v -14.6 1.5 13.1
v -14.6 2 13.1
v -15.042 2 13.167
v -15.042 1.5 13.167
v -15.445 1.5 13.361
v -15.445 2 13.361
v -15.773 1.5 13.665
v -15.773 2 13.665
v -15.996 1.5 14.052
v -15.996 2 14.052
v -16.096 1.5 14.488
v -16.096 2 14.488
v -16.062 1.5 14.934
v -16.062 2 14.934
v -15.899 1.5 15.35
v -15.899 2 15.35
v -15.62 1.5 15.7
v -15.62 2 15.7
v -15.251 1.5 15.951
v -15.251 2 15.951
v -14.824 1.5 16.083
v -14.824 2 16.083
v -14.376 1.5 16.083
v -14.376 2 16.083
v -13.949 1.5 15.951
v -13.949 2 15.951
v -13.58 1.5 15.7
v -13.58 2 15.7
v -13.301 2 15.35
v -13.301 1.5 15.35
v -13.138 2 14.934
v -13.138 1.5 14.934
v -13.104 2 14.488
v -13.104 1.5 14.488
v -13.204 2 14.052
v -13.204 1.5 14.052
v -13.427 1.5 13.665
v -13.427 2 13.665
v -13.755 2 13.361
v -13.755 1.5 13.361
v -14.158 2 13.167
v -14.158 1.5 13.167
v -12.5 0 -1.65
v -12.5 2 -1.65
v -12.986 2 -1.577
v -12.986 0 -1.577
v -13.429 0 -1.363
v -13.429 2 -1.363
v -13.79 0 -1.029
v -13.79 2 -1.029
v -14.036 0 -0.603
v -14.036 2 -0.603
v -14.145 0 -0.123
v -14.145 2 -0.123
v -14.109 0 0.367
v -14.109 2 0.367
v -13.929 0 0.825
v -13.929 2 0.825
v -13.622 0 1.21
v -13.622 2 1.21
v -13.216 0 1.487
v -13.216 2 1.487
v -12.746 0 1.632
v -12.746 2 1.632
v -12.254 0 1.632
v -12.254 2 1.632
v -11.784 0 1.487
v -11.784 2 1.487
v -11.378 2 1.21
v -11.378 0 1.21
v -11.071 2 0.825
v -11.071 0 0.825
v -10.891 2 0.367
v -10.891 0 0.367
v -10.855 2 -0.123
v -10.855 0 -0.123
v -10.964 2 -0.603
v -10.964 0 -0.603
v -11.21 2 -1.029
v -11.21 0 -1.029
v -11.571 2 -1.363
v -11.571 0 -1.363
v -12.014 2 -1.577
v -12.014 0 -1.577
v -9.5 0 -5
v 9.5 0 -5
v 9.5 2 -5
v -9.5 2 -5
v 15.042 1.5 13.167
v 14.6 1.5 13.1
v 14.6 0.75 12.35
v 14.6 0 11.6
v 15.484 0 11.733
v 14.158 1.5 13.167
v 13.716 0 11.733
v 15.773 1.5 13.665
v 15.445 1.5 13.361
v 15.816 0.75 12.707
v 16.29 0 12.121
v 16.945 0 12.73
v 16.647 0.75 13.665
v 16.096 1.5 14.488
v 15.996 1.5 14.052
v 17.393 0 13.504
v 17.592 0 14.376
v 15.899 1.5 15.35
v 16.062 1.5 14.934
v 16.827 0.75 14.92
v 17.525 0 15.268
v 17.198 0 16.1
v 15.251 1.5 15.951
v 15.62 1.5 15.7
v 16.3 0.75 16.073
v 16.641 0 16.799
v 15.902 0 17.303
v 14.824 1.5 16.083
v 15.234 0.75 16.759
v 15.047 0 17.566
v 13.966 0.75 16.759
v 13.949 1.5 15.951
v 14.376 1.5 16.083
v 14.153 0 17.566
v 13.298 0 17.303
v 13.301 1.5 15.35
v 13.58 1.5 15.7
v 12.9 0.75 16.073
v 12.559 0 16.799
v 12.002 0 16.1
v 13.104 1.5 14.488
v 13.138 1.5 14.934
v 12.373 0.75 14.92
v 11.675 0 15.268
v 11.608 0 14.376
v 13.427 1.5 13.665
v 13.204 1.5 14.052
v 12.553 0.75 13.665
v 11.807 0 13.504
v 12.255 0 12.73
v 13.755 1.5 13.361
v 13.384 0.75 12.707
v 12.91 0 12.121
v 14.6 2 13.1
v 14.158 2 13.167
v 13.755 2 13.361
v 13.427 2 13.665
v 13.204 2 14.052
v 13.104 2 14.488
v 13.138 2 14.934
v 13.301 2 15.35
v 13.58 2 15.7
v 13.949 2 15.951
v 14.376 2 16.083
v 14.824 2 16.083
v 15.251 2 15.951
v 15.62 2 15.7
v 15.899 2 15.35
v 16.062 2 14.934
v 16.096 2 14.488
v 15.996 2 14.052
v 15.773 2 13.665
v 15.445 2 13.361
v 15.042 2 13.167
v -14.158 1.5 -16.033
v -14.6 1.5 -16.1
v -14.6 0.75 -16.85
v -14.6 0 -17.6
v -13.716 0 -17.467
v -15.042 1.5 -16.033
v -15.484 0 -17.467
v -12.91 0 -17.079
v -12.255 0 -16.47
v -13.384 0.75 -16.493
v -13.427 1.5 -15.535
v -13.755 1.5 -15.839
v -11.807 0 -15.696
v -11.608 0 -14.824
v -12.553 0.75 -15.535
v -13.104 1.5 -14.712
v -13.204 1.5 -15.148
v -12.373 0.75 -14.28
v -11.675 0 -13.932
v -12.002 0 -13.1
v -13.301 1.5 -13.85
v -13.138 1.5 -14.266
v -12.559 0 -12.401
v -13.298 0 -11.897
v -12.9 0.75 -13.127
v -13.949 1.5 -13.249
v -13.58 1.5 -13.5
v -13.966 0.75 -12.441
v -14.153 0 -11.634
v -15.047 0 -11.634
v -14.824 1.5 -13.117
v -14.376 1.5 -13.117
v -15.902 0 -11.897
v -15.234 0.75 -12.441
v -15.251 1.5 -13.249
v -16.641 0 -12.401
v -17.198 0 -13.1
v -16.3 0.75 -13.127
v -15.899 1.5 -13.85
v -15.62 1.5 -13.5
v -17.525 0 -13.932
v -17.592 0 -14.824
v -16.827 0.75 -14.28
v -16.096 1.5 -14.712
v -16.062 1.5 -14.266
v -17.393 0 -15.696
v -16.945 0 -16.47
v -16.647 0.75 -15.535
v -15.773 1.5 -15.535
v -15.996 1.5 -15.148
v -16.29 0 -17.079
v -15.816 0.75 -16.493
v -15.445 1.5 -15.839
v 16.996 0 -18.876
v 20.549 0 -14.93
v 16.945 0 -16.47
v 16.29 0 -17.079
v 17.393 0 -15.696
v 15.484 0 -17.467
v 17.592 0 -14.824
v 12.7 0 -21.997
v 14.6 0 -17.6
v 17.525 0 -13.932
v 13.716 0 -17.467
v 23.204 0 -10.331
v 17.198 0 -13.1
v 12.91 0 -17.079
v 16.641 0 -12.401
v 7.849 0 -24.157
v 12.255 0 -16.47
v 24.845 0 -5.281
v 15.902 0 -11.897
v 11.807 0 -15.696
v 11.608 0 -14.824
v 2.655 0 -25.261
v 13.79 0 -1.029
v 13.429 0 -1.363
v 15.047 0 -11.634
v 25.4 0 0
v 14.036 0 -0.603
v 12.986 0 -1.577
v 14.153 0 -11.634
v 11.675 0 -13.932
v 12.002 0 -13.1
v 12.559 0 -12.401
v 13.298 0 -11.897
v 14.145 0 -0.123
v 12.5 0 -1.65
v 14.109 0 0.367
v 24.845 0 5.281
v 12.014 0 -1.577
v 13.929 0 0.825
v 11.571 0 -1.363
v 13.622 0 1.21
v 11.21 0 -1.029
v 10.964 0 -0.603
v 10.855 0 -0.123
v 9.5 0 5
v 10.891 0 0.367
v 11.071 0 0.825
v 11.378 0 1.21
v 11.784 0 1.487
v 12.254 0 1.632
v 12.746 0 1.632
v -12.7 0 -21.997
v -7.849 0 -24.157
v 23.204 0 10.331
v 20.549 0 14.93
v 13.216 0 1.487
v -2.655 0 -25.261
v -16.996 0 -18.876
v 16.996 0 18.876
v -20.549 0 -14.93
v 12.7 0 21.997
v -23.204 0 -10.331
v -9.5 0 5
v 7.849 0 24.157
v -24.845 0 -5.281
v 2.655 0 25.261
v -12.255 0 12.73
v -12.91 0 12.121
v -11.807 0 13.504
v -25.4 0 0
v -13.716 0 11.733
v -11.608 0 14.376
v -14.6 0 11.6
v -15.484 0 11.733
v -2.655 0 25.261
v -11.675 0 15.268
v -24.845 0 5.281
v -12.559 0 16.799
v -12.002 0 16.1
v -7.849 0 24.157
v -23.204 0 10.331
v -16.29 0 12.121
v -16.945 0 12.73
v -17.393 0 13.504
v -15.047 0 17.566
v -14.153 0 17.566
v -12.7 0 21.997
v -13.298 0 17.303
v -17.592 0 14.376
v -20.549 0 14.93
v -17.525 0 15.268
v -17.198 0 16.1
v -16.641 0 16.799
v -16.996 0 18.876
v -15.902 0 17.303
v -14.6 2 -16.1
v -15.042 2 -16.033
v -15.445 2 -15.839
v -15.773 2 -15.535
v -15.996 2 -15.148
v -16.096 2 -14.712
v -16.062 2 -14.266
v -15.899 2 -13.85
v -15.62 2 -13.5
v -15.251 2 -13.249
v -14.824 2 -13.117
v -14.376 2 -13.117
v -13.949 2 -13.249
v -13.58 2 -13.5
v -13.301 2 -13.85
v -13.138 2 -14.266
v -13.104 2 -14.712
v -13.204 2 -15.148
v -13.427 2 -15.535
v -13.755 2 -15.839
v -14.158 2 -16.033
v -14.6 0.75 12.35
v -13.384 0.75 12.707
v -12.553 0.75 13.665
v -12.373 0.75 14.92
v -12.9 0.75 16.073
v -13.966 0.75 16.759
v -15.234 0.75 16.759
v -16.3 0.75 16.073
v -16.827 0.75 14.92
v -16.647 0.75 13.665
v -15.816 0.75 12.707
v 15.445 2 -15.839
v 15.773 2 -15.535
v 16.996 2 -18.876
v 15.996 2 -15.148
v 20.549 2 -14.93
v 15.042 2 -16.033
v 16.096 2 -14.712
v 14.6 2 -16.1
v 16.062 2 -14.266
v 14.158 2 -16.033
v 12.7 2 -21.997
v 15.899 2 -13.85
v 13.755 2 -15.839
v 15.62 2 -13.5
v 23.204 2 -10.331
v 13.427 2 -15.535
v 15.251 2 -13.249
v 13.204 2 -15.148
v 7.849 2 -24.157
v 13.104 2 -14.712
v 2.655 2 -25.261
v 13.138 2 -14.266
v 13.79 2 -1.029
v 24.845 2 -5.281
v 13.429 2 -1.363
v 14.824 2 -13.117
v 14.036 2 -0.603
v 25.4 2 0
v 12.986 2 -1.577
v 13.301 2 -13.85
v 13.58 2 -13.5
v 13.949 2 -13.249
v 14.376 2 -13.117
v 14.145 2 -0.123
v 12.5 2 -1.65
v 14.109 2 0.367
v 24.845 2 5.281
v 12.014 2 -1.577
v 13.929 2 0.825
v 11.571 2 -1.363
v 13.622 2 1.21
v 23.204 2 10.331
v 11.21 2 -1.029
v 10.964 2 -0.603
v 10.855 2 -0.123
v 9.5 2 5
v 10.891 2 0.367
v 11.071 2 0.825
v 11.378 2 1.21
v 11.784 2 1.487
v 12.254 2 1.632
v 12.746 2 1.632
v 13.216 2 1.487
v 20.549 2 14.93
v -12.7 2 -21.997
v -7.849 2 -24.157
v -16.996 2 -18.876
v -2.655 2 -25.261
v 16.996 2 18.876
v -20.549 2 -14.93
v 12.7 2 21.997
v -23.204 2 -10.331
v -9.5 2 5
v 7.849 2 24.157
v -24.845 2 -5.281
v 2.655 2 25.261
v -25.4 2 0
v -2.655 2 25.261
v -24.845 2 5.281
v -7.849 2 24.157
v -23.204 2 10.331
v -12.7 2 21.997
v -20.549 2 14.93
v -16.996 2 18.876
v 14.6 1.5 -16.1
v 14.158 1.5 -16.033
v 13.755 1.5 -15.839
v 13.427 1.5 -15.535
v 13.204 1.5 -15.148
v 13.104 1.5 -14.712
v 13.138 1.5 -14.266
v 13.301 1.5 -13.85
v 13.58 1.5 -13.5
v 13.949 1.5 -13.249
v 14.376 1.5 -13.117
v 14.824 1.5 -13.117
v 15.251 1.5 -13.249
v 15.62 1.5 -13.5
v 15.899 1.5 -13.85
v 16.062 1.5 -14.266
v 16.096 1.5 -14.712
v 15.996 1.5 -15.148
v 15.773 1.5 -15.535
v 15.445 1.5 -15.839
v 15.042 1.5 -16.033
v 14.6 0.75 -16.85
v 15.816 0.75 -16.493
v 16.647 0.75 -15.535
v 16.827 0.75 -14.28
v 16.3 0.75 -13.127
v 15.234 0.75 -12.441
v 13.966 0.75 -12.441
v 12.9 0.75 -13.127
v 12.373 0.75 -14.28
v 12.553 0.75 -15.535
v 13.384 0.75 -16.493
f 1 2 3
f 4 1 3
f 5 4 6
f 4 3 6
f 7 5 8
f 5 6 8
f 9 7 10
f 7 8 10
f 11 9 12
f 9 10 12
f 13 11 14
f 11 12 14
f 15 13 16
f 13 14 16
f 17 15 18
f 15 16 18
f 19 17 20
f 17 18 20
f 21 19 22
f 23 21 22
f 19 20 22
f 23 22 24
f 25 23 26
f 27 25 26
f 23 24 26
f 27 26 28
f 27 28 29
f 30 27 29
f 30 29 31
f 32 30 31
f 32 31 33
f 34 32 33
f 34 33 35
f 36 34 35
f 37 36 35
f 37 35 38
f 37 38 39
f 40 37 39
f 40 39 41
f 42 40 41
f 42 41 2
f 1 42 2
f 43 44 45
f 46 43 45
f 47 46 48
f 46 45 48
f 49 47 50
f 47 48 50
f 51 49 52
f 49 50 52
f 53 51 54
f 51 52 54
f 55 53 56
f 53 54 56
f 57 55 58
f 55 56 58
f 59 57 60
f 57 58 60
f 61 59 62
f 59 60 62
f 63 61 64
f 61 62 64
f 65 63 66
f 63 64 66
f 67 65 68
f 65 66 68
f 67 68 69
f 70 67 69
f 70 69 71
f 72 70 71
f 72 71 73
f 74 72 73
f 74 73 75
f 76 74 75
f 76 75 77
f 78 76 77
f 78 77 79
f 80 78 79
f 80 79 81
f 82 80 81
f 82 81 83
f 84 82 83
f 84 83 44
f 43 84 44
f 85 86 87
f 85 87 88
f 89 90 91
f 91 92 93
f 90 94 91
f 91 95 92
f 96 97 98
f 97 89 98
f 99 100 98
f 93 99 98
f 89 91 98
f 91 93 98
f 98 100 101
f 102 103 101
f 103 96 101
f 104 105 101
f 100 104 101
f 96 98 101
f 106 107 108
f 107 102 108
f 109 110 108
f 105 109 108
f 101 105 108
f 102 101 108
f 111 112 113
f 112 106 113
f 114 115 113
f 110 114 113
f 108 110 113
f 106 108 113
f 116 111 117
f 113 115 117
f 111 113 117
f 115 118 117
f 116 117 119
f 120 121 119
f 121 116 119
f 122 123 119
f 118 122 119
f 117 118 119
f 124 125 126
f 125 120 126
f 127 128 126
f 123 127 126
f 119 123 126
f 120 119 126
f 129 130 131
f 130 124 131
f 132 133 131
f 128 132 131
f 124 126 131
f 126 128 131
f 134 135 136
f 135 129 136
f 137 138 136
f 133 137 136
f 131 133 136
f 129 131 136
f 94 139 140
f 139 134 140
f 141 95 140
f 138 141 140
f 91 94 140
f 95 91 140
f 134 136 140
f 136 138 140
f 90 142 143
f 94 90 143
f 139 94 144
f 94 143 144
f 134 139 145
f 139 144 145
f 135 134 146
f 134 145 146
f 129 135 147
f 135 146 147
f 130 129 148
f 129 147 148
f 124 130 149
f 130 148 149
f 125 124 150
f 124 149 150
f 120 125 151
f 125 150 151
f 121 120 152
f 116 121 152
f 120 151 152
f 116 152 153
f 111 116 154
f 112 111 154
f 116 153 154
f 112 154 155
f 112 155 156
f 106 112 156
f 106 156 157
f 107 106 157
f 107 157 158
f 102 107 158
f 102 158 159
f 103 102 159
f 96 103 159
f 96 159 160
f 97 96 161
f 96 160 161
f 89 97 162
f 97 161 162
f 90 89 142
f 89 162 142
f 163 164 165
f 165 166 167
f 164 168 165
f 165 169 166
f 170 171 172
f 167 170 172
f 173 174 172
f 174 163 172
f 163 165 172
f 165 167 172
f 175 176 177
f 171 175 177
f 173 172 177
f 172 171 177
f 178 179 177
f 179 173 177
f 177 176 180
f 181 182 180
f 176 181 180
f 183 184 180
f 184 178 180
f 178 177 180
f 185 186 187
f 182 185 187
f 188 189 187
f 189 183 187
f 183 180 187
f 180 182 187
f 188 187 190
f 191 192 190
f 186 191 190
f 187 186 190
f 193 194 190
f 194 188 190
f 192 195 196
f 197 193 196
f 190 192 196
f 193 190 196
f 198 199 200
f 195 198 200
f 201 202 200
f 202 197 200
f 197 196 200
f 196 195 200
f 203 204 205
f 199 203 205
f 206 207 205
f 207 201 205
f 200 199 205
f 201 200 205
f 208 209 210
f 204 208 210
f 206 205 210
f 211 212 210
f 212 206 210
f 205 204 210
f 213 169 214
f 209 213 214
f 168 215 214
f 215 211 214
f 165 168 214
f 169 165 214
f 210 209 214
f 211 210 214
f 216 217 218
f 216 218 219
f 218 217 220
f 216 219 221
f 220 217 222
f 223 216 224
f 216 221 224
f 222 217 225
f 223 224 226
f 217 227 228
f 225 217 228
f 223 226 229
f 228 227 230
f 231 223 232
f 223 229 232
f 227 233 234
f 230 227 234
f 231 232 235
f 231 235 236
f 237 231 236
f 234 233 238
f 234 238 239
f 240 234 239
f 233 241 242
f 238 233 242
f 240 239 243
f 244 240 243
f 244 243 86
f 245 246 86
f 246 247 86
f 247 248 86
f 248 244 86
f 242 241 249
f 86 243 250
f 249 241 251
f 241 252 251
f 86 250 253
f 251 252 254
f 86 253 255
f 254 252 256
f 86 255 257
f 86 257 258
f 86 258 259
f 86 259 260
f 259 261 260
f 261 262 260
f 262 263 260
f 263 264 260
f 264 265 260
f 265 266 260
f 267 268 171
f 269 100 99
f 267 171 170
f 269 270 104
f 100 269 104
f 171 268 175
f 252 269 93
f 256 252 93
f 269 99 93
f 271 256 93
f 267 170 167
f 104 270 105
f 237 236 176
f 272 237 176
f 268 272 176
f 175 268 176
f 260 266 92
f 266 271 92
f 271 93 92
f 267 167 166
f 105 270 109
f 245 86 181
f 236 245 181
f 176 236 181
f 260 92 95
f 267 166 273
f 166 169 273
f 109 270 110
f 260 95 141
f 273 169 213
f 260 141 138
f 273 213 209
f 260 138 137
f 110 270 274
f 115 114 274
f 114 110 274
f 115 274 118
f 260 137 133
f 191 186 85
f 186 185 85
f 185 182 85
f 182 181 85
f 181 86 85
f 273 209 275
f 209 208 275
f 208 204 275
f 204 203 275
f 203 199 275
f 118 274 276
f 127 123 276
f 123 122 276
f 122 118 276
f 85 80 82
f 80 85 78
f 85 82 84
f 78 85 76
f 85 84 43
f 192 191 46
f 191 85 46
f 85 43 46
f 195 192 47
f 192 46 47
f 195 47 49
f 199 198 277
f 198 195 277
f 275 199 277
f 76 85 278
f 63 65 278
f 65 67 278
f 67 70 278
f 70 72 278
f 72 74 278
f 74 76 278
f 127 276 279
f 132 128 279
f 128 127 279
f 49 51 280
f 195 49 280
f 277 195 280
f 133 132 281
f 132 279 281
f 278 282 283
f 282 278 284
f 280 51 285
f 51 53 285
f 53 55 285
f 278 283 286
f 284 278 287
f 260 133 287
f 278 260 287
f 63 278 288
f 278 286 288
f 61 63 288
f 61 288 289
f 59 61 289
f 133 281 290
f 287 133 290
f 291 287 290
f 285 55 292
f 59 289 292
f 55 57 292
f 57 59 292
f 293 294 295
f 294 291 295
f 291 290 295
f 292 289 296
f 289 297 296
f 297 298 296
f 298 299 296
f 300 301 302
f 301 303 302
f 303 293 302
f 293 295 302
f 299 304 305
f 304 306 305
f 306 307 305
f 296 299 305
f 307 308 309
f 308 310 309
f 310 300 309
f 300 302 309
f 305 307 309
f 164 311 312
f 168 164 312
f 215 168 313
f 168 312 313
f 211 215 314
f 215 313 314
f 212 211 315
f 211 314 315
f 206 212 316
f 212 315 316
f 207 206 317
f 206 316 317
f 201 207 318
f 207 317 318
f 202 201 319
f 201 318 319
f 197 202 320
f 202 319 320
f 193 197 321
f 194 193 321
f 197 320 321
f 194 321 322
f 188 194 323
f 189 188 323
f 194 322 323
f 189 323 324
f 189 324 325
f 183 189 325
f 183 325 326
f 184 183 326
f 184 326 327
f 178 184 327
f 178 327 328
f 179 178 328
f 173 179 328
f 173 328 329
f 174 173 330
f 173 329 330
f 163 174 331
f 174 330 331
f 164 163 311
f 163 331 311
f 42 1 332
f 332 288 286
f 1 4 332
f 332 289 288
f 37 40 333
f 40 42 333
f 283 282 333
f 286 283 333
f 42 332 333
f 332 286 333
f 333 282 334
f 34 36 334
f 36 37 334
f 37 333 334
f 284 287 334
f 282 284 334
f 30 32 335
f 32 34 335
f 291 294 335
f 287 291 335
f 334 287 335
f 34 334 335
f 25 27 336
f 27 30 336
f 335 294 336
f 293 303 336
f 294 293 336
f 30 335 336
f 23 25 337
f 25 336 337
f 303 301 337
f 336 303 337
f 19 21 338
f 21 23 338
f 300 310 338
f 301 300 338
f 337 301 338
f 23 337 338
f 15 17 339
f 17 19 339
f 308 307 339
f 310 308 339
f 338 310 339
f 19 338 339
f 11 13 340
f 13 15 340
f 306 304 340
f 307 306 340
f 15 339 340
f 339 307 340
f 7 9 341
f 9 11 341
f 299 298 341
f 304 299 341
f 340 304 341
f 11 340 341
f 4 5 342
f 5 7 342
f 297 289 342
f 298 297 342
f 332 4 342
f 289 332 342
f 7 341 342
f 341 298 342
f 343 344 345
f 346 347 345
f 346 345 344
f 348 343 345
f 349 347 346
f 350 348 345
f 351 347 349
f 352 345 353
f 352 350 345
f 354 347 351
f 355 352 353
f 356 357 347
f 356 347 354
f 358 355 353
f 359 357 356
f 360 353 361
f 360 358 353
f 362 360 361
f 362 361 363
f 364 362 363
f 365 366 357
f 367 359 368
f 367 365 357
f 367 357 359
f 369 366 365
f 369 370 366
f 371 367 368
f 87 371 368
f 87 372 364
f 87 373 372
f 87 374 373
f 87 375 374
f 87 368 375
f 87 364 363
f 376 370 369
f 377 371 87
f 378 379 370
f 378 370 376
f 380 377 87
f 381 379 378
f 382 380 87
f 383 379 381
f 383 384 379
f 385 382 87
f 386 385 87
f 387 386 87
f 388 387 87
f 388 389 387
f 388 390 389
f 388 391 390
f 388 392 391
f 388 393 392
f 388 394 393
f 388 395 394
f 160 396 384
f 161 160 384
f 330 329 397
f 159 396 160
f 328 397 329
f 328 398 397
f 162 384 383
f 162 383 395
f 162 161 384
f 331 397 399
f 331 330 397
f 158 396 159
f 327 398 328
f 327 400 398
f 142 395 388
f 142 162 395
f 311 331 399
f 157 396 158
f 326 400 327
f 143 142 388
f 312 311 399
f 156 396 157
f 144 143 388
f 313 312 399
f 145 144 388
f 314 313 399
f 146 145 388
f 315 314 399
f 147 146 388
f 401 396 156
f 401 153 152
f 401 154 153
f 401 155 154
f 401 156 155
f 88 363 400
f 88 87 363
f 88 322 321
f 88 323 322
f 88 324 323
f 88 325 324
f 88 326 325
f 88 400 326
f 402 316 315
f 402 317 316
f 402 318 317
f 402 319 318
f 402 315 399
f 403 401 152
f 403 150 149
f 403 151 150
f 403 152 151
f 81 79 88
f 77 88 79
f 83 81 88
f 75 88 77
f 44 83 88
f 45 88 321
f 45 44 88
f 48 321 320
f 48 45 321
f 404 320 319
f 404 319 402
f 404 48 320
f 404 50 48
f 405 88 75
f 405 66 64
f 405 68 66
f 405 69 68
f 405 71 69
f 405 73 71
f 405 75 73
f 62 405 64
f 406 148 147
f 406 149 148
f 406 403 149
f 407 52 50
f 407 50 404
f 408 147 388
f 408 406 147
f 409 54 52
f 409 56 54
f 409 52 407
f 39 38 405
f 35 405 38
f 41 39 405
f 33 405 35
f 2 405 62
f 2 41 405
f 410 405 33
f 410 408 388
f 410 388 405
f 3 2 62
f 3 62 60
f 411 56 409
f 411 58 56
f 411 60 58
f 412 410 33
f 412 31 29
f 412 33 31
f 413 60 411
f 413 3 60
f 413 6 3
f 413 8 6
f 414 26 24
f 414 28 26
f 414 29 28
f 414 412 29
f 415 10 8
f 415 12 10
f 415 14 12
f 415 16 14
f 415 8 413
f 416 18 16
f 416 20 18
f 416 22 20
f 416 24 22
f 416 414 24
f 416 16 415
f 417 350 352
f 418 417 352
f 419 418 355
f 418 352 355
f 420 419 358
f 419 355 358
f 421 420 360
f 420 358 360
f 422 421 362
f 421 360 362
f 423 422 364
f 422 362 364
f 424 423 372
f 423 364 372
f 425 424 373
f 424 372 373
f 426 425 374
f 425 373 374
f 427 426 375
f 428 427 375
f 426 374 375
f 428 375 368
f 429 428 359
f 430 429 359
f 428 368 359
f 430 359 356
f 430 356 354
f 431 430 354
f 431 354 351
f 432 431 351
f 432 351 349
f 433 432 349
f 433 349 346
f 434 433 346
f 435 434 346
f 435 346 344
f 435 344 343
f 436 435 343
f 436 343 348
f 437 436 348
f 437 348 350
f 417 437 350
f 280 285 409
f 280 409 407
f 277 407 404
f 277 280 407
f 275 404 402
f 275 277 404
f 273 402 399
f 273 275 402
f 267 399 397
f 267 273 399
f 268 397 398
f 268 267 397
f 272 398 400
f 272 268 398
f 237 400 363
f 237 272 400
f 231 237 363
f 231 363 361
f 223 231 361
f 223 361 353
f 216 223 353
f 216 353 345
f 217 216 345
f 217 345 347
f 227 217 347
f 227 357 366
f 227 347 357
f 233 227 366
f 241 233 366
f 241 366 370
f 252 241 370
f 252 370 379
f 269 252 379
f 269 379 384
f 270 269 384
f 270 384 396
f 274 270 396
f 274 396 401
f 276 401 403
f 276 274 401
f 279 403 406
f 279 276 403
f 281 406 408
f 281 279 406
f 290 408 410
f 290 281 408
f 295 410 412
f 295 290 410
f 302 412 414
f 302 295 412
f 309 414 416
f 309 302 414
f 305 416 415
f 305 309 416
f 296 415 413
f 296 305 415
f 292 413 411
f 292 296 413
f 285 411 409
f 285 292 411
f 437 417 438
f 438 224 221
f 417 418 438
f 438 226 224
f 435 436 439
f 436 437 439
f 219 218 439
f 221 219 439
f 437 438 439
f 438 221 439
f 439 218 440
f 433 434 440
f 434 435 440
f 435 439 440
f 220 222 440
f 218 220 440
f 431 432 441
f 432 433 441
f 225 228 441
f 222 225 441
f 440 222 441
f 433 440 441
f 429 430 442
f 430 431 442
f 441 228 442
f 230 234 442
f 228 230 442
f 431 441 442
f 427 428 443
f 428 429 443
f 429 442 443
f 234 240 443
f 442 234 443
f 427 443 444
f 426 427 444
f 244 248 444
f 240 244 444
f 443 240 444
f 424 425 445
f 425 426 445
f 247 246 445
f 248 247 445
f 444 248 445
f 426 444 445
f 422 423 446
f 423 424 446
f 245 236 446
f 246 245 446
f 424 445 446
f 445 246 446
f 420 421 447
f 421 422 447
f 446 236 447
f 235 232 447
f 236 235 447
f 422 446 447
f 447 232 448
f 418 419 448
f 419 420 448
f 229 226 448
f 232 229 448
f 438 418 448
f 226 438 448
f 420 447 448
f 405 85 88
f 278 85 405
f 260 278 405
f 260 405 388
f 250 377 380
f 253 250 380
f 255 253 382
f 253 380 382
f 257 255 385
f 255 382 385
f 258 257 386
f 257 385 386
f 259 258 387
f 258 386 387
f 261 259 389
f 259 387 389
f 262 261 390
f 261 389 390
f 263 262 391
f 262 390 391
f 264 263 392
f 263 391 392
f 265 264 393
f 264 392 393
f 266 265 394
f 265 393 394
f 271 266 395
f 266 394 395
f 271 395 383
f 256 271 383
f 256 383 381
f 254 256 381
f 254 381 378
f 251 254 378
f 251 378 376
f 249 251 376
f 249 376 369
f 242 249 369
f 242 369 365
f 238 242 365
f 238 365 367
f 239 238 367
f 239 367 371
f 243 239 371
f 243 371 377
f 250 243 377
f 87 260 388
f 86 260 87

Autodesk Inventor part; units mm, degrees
ref_plane "YZ Plane" through (0, 0, 0) normal (1, 0, 0) x (0, 1, 0)
ref_plane "XZ Plane" through (0, 0, 0) normal (0, 1, 0) x (-1, 0, 0)
ref_plane "XY Plane" through (0, 0, 0) normal (0, 0, 1) x (1, 0, 0)
sketch "Skizze1" plane through (0, 0, 0) normal (0, 1, 0) x (-1, 0, 0)
  circle A0 centre (0, 0) radius 25.4
  dimension "d0" = 50.8
extrude "Extrusion1" add sketch "Skizze1" along normal blind 2
sketch "Skizze2" plane through (0, 0, 0) normal (0, -1, 0) x (1, 0, 0)
  circle A0 centre (0, 0) radius 25.4 projected
  line L0 (-14.6, 14.6) -> (14.6, 14.6) construction
  line L1 (14.6, 14.6) -> (14.6, -14.6) construction
  line L2 (14.6, -14.6) -> (-14.6, -14.6) construction
  line L3 (-14.6, -14.6) -> (-14.6, 14.6) construction
  line L4 (0, 0) -> (14.6, 0) construction
  line L5 (0, 0) -> (0, 14.6) construction
  dimension "d3" = 29.2
  dimension "d4" = 29.2
hole "Bohrung1" at (-14.6, 0, 14.6) at (14.6, 0, 14.6) at (14.6, 0, -14.6) at (-14.6, 0, -14.6) direction (0, 1, 0) diameter 3 end through all countersink diameter 6 countersink angle 90
sketch "Skizze7" plane through (0, 0, 0) normal (0, -1, 0) x (1, 0, 0)
  circle A0 centre (0, 0) radius 25.4 projected
  line L0 (-9.5, 5) -> (9.5, 5)
  line L1 (9.5, 5) -> (9.5, -5)
  line L2 (9.5, -5) -> (-9.5, -5)
  line L3 (-9.5, -5) -> (-9.5, 5)
  line L4 (0, 0) -> (9.5, 0) construction
  line L5 (0, 0) -> (0, 5) construction
  line L6 (0, 0) -> (12.5, 0) construction
  line L7 (0, 0) -> (-12.5, 0) construction
  dimension "d25" = 19
  dimension "d26" = 10
  dimension "d28" = 12.5
  dimension "d29" = 12.5
extrude "Extrusion5" cut sketch "Skizze7" against normal blind 2 contours L0 L1 L2 L3
sketch "Skizze8" plane through (0, 0, 0) normal (0, -1, 0) x (1, 0, 0)
  circle A0 centre (0, 0) radius 25.4 projected
  line L0 (0, 0) -> (12.5, 0) construction
  line L1 (0, 0) -> (-12.5, 0) construction
  dimension "d32" = 12.5
  dimension "d33" = 12.5
hole "Bohrung2" at (-12.5, 0, 0) at (12.5, 0, 0) direction (0, 1, 0) diameter 3.3 end through all
properties part number "anschluss_daten_1"
